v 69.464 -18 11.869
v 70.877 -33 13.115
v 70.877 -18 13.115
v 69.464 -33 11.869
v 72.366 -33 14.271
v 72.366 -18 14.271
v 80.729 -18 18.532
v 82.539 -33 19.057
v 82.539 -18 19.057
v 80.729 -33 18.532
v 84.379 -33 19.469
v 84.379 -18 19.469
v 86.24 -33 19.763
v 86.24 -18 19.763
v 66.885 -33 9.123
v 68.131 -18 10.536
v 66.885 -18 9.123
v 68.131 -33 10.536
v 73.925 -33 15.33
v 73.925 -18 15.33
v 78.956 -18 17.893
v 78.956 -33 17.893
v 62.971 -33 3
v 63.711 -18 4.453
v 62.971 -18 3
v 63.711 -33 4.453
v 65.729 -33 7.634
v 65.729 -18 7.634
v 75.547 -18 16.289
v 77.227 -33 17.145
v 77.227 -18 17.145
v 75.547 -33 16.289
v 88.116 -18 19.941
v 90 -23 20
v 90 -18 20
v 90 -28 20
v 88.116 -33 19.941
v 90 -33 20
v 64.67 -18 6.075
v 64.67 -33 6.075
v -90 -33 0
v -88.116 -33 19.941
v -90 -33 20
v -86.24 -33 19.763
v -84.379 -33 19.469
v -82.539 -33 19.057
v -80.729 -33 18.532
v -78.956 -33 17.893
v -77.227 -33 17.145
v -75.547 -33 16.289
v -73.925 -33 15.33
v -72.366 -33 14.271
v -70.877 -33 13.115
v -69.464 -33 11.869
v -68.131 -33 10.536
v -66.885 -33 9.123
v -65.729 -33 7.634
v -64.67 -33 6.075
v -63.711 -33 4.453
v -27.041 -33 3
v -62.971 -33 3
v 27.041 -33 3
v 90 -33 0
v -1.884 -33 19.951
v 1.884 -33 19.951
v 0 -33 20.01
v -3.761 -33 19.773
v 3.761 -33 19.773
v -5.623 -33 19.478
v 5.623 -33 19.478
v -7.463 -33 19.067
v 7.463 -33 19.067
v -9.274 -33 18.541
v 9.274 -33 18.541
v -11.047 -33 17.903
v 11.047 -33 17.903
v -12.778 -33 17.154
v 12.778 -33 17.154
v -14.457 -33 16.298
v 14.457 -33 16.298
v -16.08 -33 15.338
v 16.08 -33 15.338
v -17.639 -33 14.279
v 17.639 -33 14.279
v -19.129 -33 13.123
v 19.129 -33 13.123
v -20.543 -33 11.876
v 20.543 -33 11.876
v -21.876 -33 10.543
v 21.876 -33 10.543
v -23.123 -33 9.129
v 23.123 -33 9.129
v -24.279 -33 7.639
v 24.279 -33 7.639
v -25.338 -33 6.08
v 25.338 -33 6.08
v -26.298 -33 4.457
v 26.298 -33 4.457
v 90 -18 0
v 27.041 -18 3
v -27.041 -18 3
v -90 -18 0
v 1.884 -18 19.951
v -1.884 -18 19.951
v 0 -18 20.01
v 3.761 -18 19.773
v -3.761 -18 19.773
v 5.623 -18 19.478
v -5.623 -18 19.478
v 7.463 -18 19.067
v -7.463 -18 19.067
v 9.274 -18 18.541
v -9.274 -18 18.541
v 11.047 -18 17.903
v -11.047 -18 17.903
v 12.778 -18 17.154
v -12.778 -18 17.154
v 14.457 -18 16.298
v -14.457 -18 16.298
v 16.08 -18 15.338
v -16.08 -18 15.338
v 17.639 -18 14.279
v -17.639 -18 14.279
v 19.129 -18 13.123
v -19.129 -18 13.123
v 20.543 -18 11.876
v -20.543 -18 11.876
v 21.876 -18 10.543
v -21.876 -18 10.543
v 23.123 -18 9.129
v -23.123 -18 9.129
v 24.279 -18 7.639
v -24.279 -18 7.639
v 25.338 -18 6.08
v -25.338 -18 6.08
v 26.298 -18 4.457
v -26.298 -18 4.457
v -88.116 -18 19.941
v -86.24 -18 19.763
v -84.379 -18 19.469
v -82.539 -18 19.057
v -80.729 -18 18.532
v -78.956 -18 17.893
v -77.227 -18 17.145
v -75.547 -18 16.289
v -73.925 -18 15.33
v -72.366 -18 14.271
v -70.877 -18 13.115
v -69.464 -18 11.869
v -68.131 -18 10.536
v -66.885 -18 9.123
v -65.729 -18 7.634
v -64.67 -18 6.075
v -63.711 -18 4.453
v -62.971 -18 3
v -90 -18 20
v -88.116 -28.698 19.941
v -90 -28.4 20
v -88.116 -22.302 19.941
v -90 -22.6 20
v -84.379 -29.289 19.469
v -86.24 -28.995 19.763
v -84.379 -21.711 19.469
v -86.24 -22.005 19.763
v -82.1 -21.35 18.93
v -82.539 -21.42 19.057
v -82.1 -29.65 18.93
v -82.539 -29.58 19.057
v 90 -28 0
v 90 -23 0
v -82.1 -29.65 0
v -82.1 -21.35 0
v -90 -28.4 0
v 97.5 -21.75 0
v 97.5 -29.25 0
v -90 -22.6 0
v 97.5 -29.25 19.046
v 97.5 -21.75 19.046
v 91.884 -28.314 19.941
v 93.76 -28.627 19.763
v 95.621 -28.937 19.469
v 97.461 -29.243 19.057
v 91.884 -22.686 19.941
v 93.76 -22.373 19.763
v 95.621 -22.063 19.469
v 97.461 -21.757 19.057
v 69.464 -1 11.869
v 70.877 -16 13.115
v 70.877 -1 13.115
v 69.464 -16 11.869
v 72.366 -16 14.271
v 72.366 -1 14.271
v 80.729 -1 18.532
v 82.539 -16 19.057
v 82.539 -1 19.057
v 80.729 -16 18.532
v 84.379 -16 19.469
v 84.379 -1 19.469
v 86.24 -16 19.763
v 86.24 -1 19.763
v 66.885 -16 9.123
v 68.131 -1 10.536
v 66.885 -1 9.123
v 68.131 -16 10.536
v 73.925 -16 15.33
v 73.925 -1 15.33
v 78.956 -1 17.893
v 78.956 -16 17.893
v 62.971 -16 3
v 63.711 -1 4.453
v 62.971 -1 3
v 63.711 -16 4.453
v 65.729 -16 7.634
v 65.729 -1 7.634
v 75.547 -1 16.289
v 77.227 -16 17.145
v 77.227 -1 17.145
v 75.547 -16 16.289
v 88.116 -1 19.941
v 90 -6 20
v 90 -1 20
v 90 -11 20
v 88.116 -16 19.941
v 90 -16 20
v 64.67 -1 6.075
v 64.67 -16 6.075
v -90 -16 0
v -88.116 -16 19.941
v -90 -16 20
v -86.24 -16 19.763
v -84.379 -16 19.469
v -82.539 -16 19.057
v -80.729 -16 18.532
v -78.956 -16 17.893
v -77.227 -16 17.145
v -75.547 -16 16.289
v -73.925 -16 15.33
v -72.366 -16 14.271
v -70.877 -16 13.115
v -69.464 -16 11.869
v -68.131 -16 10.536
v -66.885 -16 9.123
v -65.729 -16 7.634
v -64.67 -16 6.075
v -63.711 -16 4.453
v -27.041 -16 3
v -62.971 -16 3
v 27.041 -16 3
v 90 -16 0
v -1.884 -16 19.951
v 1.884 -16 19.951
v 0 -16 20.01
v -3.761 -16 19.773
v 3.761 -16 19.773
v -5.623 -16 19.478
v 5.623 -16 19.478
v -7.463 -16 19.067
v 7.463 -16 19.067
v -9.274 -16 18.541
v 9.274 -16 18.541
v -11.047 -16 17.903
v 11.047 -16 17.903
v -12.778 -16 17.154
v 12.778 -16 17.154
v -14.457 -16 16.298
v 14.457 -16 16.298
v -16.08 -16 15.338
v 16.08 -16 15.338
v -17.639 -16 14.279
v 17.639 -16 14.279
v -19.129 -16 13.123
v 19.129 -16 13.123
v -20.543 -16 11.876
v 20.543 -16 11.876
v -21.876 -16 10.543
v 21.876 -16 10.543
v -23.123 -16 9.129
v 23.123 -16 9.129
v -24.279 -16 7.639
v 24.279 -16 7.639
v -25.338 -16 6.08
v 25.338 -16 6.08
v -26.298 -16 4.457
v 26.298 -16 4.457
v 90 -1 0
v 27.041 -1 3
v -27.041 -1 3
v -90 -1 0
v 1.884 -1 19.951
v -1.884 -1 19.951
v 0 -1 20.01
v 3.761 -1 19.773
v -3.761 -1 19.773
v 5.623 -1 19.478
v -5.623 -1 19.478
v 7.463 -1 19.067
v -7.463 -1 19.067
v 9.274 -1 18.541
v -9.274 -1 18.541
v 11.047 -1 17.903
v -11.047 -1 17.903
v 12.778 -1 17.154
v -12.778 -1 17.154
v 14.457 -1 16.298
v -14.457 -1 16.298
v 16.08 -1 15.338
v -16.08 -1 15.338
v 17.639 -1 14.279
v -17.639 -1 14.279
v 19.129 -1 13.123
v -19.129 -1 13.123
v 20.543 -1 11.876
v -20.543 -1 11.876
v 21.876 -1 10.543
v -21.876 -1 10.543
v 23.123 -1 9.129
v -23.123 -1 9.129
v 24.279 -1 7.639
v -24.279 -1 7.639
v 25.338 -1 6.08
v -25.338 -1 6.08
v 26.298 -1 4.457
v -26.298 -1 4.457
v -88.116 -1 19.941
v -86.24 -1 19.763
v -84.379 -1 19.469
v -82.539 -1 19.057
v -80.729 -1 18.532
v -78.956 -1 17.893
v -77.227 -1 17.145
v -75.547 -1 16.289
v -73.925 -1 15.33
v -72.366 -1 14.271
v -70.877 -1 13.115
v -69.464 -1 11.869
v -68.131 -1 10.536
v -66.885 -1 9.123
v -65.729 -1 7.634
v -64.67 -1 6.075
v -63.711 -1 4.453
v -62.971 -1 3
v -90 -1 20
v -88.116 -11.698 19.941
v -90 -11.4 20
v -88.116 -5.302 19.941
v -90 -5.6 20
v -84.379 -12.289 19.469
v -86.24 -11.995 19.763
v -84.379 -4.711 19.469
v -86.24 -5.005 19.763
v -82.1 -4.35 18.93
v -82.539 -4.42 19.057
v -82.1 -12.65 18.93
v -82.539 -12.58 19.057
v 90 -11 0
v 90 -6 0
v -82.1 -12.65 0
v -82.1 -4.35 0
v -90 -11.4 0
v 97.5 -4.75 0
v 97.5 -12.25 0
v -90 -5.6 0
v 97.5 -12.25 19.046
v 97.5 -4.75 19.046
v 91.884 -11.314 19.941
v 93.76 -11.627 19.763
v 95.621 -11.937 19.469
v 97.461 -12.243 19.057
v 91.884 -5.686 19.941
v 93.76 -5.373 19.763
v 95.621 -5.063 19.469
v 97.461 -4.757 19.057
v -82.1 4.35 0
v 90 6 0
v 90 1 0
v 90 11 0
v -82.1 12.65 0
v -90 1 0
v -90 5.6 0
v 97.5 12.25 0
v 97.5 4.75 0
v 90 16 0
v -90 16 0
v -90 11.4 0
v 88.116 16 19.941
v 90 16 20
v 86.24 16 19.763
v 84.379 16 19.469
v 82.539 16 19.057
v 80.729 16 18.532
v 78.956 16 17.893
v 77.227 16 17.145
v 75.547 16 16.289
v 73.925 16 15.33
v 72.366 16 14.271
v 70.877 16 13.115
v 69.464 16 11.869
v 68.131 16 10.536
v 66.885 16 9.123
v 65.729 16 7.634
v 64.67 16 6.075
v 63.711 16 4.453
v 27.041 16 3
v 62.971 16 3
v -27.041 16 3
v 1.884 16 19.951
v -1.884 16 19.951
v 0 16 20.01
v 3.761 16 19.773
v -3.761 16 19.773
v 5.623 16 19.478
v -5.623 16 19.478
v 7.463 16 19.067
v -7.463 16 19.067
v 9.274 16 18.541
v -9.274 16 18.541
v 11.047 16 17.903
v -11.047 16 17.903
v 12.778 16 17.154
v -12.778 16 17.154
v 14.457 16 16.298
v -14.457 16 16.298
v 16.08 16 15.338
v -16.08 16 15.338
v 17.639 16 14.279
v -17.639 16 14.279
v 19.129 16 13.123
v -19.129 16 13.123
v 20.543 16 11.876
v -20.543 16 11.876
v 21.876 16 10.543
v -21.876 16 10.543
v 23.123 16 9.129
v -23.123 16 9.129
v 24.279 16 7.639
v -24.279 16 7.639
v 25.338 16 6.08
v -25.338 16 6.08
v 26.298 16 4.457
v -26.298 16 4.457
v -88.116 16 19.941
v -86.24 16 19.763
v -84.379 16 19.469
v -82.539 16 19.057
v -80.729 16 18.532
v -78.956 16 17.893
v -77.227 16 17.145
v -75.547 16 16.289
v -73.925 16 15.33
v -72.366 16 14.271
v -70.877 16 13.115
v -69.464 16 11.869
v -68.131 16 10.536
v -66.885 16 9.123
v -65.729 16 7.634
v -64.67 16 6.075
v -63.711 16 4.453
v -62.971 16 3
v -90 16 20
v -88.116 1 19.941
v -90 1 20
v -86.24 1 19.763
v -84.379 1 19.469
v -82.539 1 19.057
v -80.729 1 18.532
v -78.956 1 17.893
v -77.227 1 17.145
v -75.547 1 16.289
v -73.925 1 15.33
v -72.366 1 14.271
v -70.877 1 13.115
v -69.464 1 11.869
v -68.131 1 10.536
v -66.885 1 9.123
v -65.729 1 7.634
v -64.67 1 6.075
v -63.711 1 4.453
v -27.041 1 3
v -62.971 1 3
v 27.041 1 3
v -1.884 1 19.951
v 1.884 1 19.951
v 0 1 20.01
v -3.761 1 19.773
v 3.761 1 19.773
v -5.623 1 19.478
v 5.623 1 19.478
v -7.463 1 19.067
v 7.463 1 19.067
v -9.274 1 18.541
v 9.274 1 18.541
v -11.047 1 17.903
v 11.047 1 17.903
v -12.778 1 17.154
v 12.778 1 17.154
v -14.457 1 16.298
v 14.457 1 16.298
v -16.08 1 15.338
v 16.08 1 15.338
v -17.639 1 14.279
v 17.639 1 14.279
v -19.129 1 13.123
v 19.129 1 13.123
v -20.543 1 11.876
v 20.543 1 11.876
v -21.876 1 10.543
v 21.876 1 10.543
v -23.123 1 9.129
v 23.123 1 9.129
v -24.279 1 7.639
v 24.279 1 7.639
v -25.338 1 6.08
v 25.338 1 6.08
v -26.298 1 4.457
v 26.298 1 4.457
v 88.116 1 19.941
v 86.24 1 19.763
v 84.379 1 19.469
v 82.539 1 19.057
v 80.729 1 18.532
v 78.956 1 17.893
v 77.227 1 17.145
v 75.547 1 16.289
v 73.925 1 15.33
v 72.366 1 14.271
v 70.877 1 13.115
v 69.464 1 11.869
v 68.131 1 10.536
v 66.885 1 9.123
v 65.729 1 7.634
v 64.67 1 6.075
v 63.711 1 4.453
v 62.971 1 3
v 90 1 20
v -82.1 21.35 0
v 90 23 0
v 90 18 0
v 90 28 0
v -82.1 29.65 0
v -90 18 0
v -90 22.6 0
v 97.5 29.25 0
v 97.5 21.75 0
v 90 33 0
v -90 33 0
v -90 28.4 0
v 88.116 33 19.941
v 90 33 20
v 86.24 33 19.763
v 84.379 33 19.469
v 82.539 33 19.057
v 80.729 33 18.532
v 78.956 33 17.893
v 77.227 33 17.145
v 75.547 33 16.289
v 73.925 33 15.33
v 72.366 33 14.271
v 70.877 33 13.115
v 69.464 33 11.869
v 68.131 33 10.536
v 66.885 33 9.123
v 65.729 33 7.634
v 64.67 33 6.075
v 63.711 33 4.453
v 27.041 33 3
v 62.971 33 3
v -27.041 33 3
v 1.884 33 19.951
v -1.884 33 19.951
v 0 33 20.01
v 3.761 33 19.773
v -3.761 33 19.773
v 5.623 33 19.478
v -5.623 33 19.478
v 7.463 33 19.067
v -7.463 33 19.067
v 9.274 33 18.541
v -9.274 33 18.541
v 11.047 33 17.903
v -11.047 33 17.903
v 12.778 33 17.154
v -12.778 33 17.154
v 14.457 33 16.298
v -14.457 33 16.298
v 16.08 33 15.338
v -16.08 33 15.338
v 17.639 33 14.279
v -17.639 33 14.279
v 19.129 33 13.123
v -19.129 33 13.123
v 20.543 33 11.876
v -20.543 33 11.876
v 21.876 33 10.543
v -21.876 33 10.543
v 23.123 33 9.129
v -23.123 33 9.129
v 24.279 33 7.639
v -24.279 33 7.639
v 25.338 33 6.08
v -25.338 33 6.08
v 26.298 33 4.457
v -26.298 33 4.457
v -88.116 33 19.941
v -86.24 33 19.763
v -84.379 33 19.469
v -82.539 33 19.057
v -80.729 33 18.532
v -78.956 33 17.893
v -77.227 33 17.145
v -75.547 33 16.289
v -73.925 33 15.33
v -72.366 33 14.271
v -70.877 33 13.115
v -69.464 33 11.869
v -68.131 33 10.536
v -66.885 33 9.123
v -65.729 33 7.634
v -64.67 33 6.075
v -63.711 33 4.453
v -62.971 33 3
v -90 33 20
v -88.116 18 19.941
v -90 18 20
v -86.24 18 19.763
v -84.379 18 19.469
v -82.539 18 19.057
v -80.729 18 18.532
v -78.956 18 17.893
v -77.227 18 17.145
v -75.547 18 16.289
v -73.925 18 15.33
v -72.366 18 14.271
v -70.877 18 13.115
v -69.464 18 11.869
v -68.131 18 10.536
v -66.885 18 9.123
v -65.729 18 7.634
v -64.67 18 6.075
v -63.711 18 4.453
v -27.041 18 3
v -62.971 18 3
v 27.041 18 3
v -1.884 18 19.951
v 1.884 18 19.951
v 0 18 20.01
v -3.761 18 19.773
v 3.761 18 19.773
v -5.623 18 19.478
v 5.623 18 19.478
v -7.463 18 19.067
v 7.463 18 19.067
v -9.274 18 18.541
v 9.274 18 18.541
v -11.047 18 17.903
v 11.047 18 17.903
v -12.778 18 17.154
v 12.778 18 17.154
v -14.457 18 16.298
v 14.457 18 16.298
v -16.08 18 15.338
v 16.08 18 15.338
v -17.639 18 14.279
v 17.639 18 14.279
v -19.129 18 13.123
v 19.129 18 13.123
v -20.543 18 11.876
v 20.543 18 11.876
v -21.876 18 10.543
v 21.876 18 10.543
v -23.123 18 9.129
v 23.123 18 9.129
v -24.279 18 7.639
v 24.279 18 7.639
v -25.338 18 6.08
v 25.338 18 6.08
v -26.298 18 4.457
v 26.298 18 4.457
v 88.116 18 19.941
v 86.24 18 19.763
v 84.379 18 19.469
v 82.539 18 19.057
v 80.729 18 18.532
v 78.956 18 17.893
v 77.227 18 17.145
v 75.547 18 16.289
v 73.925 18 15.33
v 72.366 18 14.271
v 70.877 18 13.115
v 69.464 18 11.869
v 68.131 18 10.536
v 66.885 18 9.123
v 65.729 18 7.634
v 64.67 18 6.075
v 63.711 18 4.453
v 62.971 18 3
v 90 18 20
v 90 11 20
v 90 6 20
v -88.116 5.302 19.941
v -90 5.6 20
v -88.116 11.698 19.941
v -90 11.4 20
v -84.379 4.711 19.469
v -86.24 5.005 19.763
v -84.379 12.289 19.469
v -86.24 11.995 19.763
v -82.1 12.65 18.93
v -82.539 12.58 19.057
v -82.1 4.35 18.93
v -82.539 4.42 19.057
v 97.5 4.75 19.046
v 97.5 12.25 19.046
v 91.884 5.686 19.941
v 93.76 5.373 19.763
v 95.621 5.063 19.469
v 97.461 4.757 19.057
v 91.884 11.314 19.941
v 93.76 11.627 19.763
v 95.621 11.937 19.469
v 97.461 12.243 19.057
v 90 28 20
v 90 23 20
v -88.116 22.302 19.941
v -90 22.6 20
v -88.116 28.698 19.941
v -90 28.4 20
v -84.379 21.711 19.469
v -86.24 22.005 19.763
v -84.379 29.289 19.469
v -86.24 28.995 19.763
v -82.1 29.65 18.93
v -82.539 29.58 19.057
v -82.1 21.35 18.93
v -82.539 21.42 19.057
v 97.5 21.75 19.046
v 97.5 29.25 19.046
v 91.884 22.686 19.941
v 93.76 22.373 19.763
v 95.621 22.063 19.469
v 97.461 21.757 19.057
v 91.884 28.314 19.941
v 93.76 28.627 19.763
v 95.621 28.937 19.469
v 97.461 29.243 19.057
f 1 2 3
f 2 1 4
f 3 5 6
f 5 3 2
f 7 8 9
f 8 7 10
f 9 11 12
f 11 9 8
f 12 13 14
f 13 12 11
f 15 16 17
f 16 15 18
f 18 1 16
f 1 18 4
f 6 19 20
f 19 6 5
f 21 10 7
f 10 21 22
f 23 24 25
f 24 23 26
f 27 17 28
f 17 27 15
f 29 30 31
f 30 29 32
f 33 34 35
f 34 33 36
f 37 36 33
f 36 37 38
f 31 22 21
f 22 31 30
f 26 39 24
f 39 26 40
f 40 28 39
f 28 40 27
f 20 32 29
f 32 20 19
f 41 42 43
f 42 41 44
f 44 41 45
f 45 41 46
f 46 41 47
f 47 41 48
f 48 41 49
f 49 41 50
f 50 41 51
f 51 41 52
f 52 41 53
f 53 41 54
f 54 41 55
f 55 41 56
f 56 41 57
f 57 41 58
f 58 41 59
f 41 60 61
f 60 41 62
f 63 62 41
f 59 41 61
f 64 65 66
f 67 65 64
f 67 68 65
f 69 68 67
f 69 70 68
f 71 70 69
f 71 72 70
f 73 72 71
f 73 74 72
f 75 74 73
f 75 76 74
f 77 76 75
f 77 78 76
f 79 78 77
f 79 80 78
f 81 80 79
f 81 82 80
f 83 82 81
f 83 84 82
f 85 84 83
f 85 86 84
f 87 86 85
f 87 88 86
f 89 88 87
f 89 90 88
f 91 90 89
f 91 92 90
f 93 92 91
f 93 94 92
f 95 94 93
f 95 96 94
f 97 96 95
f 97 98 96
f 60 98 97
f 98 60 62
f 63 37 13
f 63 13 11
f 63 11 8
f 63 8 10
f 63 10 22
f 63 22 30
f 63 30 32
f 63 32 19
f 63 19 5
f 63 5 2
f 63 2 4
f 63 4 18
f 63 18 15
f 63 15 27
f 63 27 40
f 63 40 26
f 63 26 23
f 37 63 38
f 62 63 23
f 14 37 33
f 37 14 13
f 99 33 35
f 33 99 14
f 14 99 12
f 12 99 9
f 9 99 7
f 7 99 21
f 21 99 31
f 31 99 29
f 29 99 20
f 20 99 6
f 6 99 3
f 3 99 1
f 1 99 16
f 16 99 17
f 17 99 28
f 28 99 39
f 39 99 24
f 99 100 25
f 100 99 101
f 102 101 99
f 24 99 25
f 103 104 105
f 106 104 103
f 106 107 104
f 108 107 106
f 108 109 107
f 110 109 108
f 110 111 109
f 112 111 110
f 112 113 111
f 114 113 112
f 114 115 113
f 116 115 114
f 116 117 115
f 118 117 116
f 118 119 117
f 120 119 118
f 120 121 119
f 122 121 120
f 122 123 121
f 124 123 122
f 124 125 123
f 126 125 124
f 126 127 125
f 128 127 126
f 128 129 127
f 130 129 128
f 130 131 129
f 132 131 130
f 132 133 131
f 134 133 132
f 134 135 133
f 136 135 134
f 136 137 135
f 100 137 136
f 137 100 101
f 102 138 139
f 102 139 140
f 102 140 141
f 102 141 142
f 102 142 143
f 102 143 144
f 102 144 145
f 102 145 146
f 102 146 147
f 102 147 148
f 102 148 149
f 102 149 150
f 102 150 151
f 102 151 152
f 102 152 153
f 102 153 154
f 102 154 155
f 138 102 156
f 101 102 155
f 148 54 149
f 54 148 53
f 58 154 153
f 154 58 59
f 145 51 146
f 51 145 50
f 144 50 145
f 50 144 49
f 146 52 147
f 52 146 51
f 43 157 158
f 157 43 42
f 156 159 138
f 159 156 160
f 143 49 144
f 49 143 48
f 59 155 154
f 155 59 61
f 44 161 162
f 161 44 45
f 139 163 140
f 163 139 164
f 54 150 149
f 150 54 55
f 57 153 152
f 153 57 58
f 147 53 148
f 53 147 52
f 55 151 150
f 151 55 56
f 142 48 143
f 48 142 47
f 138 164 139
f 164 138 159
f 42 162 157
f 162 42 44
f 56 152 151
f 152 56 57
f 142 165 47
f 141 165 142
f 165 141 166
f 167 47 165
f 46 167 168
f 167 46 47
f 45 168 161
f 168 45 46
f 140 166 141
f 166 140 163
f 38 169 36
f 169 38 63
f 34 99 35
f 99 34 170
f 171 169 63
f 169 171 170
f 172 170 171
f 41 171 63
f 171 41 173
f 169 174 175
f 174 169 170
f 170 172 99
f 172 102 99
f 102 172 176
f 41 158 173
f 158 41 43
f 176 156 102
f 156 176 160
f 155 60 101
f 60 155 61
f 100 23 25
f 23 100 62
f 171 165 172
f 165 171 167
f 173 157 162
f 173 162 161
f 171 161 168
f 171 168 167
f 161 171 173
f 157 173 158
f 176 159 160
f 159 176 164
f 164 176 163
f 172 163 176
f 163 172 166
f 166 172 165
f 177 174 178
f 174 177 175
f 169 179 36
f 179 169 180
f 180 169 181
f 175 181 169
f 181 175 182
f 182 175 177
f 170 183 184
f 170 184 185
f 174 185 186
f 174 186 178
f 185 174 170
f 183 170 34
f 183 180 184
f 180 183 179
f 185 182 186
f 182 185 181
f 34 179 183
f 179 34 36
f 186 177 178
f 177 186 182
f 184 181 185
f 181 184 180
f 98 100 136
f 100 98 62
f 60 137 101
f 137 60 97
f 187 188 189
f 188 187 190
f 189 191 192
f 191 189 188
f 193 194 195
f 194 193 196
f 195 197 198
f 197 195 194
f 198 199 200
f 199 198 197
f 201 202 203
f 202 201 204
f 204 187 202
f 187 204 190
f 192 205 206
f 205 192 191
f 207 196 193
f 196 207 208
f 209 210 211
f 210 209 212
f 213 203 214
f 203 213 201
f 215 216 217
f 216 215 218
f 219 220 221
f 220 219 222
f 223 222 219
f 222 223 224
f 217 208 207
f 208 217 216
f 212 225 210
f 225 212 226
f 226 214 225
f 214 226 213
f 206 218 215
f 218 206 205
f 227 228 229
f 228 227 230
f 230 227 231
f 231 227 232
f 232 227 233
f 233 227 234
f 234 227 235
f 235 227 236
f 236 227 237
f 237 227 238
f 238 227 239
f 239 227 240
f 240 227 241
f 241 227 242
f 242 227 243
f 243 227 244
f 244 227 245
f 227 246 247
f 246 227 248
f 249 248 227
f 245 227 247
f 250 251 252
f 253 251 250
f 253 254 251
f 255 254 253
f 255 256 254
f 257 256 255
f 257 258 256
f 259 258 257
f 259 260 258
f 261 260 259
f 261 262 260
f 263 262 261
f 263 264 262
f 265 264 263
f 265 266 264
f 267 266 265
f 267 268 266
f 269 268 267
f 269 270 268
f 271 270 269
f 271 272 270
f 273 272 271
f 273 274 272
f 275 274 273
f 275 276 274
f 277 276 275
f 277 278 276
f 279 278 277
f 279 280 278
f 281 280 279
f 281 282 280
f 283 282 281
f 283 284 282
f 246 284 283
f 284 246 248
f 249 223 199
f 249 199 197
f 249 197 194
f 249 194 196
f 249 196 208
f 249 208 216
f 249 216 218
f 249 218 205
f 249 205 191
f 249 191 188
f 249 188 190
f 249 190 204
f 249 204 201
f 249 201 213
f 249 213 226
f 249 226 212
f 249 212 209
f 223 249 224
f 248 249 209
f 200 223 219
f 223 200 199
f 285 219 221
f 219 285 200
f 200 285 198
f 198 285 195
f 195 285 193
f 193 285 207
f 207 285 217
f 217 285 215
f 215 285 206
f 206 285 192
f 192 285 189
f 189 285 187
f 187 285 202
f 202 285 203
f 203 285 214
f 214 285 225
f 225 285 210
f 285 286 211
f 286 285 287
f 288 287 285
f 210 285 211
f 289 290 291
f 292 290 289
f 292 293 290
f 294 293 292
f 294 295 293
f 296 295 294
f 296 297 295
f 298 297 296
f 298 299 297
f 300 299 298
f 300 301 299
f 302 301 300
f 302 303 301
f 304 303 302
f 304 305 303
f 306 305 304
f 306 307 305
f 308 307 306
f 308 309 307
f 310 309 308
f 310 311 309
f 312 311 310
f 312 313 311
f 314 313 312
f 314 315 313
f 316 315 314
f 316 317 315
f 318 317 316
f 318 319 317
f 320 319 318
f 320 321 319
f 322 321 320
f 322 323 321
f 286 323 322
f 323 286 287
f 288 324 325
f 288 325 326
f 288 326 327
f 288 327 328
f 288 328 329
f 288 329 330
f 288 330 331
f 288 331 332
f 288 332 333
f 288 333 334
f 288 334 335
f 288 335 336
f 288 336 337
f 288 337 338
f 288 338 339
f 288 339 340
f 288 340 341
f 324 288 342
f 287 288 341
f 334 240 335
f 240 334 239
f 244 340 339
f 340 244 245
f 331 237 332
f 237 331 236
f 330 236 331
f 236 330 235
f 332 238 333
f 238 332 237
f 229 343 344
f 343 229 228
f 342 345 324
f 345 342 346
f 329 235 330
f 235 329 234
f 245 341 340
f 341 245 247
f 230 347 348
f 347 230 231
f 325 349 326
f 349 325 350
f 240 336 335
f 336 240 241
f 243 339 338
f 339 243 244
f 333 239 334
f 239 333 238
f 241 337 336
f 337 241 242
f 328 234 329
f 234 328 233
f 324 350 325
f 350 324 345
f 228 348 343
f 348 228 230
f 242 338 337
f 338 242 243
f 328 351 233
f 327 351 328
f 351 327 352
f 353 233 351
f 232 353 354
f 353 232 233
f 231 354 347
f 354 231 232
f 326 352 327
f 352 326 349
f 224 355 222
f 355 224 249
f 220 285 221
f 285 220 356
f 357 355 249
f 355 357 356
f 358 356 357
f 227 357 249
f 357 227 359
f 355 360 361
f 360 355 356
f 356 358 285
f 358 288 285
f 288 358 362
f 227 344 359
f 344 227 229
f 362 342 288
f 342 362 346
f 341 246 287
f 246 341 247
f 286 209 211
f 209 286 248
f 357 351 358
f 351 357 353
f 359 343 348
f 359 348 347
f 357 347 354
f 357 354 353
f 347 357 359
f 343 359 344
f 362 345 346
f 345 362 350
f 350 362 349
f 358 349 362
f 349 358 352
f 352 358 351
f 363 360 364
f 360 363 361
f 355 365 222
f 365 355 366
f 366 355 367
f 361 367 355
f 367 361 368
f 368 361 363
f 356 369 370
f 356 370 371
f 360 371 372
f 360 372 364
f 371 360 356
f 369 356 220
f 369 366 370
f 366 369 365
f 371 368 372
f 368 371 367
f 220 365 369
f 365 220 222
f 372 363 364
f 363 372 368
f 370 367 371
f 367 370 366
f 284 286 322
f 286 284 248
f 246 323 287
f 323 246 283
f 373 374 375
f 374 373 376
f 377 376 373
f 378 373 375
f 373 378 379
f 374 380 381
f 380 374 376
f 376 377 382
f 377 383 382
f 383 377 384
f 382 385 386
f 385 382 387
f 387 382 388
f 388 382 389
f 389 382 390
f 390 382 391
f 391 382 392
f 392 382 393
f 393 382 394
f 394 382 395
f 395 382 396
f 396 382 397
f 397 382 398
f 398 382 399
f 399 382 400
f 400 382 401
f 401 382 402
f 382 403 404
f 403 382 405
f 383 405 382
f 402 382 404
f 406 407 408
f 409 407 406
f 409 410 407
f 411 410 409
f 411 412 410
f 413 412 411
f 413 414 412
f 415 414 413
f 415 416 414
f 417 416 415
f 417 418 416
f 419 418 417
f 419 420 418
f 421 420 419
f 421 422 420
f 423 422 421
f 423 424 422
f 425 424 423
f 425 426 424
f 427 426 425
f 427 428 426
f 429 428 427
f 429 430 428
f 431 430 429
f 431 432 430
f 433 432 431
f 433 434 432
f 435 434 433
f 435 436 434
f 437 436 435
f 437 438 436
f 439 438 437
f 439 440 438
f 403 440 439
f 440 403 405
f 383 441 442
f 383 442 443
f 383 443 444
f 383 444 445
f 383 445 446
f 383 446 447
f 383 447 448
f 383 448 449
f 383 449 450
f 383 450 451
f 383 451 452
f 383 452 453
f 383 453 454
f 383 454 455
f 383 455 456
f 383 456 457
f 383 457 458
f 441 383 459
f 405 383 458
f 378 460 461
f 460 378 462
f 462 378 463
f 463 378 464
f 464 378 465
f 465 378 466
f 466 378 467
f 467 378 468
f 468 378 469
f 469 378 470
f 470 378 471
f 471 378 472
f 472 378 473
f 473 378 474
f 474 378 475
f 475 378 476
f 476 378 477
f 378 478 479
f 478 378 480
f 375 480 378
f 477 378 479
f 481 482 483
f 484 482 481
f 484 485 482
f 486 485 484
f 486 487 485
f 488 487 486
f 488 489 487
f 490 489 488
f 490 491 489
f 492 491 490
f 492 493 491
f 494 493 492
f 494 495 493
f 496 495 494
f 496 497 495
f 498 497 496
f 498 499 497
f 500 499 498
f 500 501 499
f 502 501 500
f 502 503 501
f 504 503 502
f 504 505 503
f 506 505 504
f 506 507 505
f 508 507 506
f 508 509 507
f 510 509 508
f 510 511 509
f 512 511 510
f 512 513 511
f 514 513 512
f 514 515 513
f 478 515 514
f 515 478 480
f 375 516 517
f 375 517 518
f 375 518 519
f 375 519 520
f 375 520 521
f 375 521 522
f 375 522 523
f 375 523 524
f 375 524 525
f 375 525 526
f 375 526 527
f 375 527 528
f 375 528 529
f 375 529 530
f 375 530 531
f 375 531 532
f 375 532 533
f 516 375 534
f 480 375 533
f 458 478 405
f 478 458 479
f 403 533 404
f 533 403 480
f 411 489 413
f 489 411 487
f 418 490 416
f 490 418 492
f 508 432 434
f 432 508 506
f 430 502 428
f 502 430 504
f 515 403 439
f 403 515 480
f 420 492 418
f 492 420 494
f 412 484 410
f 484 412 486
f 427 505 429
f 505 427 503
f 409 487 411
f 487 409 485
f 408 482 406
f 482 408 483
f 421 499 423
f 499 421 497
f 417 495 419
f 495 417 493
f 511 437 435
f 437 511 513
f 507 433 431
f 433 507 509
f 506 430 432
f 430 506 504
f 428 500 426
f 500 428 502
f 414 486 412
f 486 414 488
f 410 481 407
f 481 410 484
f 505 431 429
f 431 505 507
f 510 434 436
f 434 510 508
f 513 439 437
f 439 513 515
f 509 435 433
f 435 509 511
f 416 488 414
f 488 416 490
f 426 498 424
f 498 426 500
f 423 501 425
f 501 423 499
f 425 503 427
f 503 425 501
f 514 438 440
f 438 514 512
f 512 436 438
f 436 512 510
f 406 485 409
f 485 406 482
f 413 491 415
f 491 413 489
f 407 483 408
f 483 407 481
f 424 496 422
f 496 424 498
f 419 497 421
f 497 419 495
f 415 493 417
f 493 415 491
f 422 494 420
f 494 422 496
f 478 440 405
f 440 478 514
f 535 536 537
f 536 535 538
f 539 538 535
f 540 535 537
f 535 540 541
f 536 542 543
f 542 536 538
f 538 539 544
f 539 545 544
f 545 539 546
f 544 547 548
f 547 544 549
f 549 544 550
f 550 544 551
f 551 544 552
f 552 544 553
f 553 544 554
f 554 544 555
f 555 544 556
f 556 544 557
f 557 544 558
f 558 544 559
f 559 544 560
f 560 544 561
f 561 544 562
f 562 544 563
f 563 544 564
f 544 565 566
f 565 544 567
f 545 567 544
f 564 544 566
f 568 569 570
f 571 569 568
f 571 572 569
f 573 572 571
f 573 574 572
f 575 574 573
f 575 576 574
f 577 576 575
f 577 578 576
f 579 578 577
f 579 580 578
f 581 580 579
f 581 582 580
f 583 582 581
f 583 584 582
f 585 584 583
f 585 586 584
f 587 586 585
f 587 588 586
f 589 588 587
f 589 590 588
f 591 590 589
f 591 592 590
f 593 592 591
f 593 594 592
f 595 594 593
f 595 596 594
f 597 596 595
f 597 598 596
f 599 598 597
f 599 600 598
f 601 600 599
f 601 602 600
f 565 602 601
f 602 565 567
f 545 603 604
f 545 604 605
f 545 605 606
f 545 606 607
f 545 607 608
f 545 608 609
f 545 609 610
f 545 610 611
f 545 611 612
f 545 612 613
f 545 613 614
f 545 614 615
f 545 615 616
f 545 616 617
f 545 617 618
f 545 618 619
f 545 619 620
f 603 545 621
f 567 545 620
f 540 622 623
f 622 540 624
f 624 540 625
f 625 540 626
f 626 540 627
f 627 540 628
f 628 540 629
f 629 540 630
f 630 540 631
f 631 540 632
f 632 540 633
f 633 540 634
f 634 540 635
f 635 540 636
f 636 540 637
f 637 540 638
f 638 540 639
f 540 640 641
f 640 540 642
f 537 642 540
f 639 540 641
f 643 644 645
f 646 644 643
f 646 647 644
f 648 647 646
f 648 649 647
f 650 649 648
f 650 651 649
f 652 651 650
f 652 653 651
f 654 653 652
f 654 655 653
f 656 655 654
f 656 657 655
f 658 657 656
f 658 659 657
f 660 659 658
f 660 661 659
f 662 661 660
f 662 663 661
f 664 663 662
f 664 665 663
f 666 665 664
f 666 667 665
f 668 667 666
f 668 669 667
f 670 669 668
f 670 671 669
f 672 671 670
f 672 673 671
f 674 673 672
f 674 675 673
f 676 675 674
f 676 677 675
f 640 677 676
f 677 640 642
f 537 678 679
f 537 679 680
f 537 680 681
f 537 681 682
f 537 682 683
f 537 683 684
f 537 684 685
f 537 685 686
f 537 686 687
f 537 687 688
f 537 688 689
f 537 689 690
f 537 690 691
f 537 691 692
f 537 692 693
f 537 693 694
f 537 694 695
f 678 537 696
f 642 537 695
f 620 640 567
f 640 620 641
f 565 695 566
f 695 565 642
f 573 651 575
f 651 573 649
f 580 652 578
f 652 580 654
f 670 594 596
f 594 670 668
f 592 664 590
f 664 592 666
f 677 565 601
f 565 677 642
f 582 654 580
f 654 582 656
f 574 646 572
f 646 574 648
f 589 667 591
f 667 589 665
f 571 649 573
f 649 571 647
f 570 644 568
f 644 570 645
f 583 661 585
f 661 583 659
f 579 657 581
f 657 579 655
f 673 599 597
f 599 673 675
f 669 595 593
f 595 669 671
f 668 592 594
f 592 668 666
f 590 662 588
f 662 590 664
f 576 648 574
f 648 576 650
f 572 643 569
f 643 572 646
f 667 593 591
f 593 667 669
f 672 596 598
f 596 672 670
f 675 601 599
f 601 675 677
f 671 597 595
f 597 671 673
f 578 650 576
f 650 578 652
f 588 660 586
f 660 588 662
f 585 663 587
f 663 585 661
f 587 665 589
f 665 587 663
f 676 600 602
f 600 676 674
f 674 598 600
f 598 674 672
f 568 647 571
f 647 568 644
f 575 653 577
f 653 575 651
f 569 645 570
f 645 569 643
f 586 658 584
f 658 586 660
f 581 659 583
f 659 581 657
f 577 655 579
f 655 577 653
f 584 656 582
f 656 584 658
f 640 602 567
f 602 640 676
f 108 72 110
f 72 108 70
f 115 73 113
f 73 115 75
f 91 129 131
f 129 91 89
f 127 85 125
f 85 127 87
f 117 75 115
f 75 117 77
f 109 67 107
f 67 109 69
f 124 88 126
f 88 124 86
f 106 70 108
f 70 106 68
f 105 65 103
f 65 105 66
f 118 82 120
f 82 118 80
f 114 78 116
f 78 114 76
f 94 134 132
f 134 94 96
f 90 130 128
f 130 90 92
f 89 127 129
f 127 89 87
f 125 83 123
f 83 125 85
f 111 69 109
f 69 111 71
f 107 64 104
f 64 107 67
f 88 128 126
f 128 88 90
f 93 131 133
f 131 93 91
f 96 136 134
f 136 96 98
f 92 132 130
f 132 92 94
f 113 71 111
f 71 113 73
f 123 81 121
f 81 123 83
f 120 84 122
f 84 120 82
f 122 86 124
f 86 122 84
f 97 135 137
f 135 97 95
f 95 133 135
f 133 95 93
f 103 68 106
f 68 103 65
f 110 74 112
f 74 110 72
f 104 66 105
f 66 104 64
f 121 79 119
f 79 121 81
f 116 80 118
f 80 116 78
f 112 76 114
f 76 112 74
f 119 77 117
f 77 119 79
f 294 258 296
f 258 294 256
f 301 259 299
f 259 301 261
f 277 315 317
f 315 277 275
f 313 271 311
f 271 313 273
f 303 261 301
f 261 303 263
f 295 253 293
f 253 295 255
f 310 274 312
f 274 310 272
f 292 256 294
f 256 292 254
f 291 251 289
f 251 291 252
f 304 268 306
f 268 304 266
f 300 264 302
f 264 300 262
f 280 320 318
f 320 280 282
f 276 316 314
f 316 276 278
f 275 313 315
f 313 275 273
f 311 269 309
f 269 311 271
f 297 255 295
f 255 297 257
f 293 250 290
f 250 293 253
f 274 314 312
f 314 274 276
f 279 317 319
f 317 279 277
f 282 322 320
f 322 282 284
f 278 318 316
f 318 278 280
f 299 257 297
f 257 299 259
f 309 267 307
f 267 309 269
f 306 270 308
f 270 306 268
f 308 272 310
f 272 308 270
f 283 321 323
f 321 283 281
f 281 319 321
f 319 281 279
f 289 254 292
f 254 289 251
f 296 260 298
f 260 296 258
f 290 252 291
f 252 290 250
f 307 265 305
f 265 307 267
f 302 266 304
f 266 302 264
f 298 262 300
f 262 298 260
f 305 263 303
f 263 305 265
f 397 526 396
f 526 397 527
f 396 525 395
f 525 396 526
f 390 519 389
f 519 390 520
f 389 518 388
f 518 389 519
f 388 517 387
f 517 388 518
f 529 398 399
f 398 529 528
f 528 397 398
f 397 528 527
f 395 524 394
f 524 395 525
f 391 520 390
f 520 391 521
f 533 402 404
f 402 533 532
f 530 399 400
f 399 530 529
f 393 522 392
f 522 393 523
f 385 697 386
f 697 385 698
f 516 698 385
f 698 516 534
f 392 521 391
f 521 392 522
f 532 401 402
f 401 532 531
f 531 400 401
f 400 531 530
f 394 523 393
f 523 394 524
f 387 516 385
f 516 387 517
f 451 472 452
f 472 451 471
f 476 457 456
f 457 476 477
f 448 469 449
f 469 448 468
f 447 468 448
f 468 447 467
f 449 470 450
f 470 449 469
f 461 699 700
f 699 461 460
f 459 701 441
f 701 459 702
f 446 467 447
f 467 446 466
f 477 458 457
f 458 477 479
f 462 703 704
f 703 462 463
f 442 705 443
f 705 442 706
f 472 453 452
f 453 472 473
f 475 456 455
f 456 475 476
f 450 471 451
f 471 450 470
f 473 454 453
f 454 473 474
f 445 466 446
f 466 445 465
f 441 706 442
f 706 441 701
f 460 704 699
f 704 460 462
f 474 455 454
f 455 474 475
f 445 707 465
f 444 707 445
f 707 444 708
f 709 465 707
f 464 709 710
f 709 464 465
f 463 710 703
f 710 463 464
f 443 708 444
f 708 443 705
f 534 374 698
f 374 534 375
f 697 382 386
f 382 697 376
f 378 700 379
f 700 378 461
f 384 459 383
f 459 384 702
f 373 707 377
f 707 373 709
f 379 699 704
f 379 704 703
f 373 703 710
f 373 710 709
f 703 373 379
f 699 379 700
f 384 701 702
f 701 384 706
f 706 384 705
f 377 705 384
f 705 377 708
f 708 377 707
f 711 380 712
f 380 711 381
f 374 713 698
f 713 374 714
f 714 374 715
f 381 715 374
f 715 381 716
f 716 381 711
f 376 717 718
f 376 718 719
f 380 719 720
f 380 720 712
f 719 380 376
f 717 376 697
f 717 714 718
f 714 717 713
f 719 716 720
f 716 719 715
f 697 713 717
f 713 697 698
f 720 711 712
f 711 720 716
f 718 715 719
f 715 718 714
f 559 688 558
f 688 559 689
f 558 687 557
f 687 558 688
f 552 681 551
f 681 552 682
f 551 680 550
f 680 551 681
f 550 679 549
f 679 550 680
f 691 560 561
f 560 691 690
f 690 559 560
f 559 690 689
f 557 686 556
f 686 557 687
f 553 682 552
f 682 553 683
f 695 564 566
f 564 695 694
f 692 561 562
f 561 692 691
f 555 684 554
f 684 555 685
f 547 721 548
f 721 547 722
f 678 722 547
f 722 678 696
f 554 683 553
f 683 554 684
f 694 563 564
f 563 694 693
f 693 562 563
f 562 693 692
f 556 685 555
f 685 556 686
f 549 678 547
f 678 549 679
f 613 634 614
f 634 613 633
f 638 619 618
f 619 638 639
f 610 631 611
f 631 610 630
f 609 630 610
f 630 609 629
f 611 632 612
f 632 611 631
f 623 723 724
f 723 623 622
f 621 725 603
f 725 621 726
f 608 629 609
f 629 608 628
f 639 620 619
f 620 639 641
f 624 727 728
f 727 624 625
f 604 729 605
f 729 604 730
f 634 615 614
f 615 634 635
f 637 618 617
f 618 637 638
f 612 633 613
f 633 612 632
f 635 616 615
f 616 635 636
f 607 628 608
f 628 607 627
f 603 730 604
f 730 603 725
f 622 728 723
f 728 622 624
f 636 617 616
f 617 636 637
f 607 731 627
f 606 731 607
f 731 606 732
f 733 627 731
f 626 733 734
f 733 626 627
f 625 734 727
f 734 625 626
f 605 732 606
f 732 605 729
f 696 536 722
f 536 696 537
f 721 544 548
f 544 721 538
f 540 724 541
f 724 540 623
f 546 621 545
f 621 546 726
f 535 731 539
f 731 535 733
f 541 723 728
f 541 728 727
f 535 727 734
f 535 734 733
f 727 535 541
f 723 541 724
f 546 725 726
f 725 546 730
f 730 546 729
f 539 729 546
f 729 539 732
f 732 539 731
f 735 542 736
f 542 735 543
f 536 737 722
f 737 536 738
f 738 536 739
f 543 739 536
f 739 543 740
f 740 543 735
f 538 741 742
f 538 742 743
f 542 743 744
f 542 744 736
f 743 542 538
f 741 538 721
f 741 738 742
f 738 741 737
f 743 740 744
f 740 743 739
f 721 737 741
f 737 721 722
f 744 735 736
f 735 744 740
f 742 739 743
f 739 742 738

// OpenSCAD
// [FL_INDEX: keywords="openscad, 3d_parametric, Customizable__Bump_Strip__Bottle_Holder, csg_solid" | COT="Parametric OpenSCAD design from 3DCodeverse"]
// Title: Customizable 'Bump Strip' Bottle Holder

//*********User Defined variables****************

//How many pairs of strips do you want to print?
pairs=2;

//What's the primary color?
primary_color="white"; //[black,silver,gray,white,maroon,red,purple,fuchsia,green,lime,olive,yellow,navy,blue,teal,aqua]

//What's the secondary color?
secondary_color="red"; //[black,silver,gray,white,maroon,red,purple,fuchsia,green,lime,olive,yellow,navy,blue,teal,aqua]

//This design will output 3 files - one for printing in a solid color and 2 for printing using dualstrusion.
part = "Solid"; //[Solid,Dual1,Dual2]

//If you're dualstruding, do you want all strips the same or do you want half with the colors reversed?
dualstrusion_mix = "mixed"; //[all the same,mixed]

//About how wide should each bottle space be? 90mm works well for wine bottles.
bottle_space_width=90;

//How deep should the strips be?  15 mm works well for wine bottles.
strip_depth=15;

//How thick should the strips be?
strip_thickness=3;

//How far apart do you want the strips spaced on the build platform?
spacing = 2;

//What tolerance should be used for the dovetail joints?
tolerance=.4;


//*****Dimensional Parameters*****
//*****These are currently set for standard wine bottles****
length = bottle_space_width; //This is really half the overall length, so final length = length*2
depth = strip_depth; //depth of the strip
base_thick = strip_thickness; //thickness of the base
bump = 1/3*bottle_space_width; // radius of the circles that form the bumps in the strip
clearance = 2/3*bump; //height above the base that the bumps will protrude
res=100*1; //resolution for rendering of circles
tol=tolerance;


//**********Calculated Variables*****
count=pairs*2;


//**********Generate parts***********


//*******first color**********//
if(part=="Dual1" || part=="Solid")color(primary_color){
	//***********all parts dualstruded*******//
	if(dualstrusion_mix=="all the same"){
		for(i=[0:count-1]){
			translate([0,(-(count-1)*(depth+spacing))/2+i*(depth+spacing),0]){
				difference(){
					strip();
					center_void();
				}
			}
		}
	}
	//***********half parts dualstruded normally, half colors reversed*****//
	if(dualstrusion_mix=="mixed"){
		for(i=[0:pairs-1]){
			translate([0,(-(count-1)*(depth+spacing))/2+i*(depth+spacing),0]){
				difference(){
					strip();
					center_void();
				}
			}
		}
		for(i=[pairs:count-1]){
			translate([0,(-(count-1)*(depth+spacing))/2+i*(depth+spacing),0]){
				center();
			}
		}
	}
}

//////////*********Second color for dualstrusion*****
if(part=="Dual2" || part=="Solid")color(secondary_color){
	//***********all parts dualstruded*******//
	if(dualstrusion_mix=="all the same"){
		for(i=[0:count-1]){
			translate([0,(-(count-1)*(depth+spacing))/2+i*(depth+spacing),0]){
				center();
			}
		}
	}
	//***********half parts dualstruded normally, half colors reversed*****//
	if(dualstrusion_mix=="mixed"){
		for(i=[0:pairs-1]){
			translate([0,(-(count-1)*(depth+spacing))/2+i*(depth+spacing),0]){
				center();
			}
		}
		for(i=[pairs:count-1]){
			translate([0,(-(count-1)*(depth+spacing))/2+i*(depth+spacing),0]){
				difference(){
					strip();
					center_void();
				}
			}
		}
	}
}



//**********************************************
/////////////////Define main component//////////
//**********************************************

module strip(){

	difference(){
	
	union(){
	
		translate([0,0,base_thick/2])cube([2*length,depth,base_thick], center=true);
		
			intersection(){
			
				union(){
					translate([length,0,-bump+clearance])rotate([90,0,0])cylinder(h=depth,r=bump,center=true,$fn=res);
					translate([0,0,-bump+clearance])rotate([90,0,0])cylinder(h=depth,r=bump,center=true,$fn=res);
					translate([-length,0,-bump+clearance])rotate([90,0,0])cylinder(h=depth,r=bump,center=true,$fn=res);
				}
			
				translate([0,0,bump])cube([2*length,depth,2*bump],center=true);
		}
	}
	
	translate([-length,0,0])linear_extrude(height = bump)polygon([[0,1/6*depth+tol],[1/2*depth+tol,1/4*depth+tol],[1/2*depth+tol,-1/4*depth-tol],[0,-1/6*depth-tol]],[[0,1,2,3]]);
	
	}
	
	
	
	intersection(){
		translate([length,0,0])linear_extrude(height = bump)polygon([[0,1/6*depth],[1/2*depth,1/4*depth],[1/2*depth,-1/4*depth],[0,-1/6*depth]],[[0,1,2,3]]);
		translate([length,0,-bump+clearance])rotate([90,0,0])cylinder(h=depth,r=bump,center=true,$fn=res);
	}
}




//**************************************************************************
/////////////////Define void on main piece for dualstrusion//////////
////////////////Slightly thicker than center piece to eliminate "plane" of polygons////
//**************************************************************************

module center_void(){
		
	intersection(){

		translate([0,0,-bump+clearance])rotate([90,0,0])cylinder(h=depth+spacing/4,r=bump+.01,center=true,$fn=res);
	
		difference(){
			translate([0,0,0])cube([2*length,depth+spacing/4,2*bump],center=true);
			translate([0,0,0])cube([2*length,depth/3,2*base_thick],center=true);
		}
	}
}




//**************************************************************************
/////////////////Define second color center piece for dualstrusion//////////
//**************************************************************************

module center(){
		
	intersection(){

		translate([0,0,-bump+clearance])rotate([90,0,0])cylinder(h=depth,r=bump+.01,center=true,$fn=res);
	
		difference(){
			translate([0,0,bump])cube([2*length,depth,2*bump],center=true);
			translate([0,0,base_thick/2])cube([2*length,depth/3,base_thick],center=true);
		}
	}
}
